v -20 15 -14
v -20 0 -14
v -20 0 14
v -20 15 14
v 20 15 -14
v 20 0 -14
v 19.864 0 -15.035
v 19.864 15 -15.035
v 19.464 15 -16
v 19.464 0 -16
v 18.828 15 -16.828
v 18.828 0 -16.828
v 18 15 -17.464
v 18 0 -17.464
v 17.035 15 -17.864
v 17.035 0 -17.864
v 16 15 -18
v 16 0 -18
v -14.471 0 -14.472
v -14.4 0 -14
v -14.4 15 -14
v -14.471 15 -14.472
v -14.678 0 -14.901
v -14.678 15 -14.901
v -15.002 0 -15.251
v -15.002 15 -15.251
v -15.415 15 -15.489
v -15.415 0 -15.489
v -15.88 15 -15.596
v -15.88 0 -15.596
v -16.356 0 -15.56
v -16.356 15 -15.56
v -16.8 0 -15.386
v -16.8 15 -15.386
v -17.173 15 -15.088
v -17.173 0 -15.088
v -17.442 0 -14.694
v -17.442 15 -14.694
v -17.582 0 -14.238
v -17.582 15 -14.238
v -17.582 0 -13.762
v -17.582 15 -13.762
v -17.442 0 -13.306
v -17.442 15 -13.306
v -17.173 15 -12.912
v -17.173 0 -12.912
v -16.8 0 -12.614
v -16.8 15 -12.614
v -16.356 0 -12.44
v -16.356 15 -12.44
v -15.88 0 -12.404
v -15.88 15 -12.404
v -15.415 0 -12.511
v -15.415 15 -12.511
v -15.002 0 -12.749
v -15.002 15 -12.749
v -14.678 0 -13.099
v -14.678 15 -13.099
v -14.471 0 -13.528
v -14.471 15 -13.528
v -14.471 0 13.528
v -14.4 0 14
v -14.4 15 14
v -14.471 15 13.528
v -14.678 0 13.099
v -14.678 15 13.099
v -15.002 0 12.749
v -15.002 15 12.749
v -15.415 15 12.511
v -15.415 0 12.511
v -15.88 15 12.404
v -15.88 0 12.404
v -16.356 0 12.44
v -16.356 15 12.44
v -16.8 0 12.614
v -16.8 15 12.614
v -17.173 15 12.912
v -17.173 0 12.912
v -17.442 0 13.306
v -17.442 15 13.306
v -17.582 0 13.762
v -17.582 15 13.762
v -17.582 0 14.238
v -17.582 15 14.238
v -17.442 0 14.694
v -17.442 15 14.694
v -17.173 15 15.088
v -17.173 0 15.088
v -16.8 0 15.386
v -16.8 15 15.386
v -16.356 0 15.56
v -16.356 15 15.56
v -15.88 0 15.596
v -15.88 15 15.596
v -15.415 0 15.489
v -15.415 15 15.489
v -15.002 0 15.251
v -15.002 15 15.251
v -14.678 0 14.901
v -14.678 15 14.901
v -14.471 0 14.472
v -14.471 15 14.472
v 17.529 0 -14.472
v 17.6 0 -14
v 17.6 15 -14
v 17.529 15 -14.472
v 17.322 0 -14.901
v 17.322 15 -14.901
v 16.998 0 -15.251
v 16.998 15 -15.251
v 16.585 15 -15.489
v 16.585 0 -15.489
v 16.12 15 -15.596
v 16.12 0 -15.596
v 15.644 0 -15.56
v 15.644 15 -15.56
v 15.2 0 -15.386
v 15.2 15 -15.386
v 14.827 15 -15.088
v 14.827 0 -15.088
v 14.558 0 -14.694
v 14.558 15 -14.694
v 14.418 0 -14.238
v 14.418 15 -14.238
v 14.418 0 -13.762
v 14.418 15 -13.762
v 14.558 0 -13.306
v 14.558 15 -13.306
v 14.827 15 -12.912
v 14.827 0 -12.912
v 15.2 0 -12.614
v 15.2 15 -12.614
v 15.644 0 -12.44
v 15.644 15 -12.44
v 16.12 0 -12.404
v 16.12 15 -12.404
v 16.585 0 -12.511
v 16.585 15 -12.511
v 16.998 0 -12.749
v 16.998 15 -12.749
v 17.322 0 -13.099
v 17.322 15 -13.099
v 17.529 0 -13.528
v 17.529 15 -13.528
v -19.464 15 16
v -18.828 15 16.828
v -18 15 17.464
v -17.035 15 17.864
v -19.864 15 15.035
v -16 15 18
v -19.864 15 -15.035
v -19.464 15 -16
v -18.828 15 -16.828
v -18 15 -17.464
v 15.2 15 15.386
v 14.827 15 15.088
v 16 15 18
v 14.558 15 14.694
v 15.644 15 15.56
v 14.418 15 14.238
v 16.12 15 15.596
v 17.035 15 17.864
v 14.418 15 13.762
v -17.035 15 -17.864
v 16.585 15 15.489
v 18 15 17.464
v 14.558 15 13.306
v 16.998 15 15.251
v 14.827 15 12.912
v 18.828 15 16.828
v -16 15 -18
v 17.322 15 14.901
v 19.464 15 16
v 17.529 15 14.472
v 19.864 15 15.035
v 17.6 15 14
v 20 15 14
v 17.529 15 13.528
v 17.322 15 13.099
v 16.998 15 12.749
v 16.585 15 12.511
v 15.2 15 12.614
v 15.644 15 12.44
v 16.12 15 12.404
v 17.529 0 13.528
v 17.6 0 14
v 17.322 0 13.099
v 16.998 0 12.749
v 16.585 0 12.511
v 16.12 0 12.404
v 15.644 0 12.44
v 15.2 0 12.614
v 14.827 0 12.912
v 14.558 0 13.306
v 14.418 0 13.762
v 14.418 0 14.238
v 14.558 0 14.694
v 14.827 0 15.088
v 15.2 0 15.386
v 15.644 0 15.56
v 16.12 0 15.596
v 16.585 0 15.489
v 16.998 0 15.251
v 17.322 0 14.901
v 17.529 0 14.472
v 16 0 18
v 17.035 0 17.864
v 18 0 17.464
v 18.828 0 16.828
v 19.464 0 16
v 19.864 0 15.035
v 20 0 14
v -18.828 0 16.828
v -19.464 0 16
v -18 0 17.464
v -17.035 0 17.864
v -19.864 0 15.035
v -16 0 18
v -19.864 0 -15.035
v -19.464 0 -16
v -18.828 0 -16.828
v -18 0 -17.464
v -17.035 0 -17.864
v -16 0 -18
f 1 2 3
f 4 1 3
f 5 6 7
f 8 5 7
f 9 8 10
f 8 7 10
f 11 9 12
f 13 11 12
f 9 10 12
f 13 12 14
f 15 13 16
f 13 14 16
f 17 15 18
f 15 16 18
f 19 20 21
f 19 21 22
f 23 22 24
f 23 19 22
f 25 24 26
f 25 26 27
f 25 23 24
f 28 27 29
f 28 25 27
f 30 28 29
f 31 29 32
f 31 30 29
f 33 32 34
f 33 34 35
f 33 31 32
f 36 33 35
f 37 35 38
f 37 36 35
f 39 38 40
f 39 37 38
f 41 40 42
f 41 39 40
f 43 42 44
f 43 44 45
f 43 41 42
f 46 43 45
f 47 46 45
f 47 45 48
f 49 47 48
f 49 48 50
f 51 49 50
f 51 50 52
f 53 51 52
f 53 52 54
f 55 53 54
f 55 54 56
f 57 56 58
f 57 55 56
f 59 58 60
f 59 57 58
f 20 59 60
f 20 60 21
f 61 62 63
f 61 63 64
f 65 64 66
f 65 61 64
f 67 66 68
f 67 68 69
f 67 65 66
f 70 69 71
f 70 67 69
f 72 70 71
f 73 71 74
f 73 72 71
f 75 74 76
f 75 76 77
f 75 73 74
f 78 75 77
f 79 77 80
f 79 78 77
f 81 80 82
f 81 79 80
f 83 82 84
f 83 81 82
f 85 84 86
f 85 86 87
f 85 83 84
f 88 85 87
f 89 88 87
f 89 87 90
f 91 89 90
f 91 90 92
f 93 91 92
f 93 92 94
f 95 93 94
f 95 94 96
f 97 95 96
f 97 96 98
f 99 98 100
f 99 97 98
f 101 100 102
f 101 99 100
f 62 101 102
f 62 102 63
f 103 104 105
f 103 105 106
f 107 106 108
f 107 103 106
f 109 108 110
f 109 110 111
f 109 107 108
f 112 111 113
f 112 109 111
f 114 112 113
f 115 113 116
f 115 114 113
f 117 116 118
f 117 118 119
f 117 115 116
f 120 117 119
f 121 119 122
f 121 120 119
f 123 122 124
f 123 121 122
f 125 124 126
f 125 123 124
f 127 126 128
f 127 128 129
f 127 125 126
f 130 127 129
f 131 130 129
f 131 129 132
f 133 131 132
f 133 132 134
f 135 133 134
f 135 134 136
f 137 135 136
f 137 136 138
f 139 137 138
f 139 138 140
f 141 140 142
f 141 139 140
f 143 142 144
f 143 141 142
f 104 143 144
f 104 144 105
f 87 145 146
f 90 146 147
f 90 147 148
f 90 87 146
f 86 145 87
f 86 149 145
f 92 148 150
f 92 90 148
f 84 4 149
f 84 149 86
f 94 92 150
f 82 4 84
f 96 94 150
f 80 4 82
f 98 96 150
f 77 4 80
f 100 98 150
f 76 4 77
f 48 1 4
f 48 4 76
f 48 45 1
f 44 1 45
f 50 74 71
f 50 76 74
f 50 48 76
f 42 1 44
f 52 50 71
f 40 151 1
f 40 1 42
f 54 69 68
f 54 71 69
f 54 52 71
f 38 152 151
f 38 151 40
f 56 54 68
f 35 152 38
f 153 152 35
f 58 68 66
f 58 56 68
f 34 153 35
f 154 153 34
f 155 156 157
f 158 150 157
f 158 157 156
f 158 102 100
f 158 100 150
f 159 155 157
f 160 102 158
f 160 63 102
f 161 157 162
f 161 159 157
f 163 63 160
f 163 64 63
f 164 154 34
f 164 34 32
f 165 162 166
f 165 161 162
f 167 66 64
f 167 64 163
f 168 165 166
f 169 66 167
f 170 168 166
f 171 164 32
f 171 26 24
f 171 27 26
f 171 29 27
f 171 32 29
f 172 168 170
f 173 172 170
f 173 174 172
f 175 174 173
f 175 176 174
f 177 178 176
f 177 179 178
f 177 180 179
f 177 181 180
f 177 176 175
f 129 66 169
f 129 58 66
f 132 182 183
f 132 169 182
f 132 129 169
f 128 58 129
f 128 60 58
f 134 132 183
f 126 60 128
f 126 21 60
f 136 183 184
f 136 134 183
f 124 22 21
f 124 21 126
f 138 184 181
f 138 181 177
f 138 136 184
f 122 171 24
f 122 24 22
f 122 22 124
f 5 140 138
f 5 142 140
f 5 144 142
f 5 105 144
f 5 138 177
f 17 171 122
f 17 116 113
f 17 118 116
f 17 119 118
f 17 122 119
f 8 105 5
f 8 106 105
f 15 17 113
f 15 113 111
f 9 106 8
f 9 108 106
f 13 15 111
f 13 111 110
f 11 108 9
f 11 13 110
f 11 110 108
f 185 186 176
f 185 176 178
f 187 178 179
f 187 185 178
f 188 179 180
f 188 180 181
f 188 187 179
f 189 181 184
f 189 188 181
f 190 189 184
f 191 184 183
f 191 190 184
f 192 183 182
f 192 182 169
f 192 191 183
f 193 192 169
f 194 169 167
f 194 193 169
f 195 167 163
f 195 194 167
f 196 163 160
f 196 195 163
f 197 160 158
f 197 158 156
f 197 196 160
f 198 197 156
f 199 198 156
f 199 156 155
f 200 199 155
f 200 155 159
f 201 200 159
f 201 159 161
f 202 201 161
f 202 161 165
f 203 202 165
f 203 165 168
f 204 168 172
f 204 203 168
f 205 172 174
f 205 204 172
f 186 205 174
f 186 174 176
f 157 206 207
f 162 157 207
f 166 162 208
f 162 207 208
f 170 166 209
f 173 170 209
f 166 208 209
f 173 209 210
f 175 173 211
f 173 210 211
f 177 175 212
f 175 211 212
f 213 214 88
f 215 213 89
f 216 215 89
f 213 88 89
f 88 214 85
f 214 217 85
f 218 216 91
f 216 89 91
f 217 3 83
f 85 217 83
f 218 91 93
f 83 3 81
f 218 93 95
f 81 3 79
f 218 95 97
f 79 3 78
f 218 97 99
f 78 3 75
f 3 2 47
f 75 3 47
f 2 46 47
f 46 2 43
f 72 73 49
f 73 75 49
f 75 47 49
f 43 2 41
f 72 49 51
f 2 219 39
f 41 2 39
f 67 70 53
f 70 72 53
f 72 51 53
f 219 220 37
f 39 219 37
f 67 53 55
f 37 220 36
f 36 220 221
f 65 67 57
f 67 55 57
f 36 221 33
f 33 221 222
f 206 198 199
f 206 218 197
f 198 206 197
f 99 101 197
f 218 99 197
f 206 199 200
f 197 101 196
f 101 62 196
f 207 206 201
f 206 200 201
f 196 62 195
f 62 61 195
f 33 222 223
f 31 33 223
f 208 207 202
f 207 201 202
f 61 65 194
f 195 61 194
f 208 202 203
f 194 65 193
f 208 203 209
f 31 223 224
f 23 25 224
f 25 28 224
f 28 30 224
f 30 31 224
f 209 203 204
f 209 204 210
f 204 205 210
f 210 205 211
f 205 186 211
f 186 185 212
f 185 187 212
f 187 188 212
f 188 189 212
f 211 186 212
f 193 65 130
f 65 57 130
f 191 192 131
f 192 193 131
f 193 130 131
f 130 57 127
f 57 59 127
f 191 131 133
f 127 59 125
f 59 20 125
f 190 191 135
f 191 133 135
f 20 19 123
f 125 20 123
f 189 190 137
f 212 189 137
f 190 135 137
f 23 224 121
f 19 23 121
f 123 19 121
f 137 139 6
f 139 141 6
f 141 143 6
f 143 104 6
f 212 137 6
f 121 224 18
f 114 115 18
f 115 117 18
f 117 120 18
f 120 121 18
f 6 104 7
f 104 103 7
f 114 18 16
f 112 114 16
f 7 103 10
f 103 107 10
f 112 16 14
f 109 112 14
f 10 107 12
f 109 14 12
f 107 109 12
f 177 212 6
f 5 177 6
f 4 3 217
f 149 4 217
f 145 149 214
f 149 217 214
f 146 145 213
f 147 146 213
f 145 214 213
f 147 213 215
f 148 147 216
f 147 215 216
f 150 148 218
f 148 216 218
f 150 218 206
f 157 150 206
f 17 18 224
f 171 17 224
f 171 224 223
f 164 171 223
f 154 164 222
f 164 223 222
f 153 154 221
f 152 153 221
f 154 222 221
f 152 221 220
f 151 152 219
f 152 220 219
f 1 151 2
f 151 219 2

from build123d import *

# Parameters (mm, degrees)
SKETCH1_R           = 1.6
BOSS_EXTRUDE1_DEPTH = 15


with BuildPart() as part:
    # Sketch1 → Boss-Extrude1 (new body)
    with BuildSketch(Plane(origin=(0, 0, 0), x_dir=(1, 0, 0), z_dir=(0, 1, 0))):
        with BuildLine():
            Line((-16, -18), (16, -18))
            ThreePointArc((16, -18), (18.828427125, -16.828427125), (20, -14))
            Line((20, -14), (20, 14))
            ThreePointArc((20, 14), (18.828427125, 16.828427125), (16, 18))
            Line((16, 18), (-16, 18))
            ThreePointArc((-16, 18), (-18.828427125, 16.828427125), (-20, 14))
            Line((-20, 14), (-20, -14))
            ThreePointArc((-20, -14), (-18.828427125, -16.828427125), (-16, -18))
        make_face()
        with Locations((16, 14)):
            Circle(SKETCH1_R, mode=Mode.SUBTRACT)
        with Locations((-16, 14)):
            Circle(SKETCH1_R, mode=Mode.SUBTRACT)
        with Locations((-16, -14)):
            Circle(SKETCH1_R, mode=Mode.SUBTRACT)
        with Locations((16, -14)):
            Circle(SKETCH1_R, mode=Mode.SUBTRACT)
    extrude(amount=BOSS_EXTRUDE1_DEPTH)


solid = part.part
